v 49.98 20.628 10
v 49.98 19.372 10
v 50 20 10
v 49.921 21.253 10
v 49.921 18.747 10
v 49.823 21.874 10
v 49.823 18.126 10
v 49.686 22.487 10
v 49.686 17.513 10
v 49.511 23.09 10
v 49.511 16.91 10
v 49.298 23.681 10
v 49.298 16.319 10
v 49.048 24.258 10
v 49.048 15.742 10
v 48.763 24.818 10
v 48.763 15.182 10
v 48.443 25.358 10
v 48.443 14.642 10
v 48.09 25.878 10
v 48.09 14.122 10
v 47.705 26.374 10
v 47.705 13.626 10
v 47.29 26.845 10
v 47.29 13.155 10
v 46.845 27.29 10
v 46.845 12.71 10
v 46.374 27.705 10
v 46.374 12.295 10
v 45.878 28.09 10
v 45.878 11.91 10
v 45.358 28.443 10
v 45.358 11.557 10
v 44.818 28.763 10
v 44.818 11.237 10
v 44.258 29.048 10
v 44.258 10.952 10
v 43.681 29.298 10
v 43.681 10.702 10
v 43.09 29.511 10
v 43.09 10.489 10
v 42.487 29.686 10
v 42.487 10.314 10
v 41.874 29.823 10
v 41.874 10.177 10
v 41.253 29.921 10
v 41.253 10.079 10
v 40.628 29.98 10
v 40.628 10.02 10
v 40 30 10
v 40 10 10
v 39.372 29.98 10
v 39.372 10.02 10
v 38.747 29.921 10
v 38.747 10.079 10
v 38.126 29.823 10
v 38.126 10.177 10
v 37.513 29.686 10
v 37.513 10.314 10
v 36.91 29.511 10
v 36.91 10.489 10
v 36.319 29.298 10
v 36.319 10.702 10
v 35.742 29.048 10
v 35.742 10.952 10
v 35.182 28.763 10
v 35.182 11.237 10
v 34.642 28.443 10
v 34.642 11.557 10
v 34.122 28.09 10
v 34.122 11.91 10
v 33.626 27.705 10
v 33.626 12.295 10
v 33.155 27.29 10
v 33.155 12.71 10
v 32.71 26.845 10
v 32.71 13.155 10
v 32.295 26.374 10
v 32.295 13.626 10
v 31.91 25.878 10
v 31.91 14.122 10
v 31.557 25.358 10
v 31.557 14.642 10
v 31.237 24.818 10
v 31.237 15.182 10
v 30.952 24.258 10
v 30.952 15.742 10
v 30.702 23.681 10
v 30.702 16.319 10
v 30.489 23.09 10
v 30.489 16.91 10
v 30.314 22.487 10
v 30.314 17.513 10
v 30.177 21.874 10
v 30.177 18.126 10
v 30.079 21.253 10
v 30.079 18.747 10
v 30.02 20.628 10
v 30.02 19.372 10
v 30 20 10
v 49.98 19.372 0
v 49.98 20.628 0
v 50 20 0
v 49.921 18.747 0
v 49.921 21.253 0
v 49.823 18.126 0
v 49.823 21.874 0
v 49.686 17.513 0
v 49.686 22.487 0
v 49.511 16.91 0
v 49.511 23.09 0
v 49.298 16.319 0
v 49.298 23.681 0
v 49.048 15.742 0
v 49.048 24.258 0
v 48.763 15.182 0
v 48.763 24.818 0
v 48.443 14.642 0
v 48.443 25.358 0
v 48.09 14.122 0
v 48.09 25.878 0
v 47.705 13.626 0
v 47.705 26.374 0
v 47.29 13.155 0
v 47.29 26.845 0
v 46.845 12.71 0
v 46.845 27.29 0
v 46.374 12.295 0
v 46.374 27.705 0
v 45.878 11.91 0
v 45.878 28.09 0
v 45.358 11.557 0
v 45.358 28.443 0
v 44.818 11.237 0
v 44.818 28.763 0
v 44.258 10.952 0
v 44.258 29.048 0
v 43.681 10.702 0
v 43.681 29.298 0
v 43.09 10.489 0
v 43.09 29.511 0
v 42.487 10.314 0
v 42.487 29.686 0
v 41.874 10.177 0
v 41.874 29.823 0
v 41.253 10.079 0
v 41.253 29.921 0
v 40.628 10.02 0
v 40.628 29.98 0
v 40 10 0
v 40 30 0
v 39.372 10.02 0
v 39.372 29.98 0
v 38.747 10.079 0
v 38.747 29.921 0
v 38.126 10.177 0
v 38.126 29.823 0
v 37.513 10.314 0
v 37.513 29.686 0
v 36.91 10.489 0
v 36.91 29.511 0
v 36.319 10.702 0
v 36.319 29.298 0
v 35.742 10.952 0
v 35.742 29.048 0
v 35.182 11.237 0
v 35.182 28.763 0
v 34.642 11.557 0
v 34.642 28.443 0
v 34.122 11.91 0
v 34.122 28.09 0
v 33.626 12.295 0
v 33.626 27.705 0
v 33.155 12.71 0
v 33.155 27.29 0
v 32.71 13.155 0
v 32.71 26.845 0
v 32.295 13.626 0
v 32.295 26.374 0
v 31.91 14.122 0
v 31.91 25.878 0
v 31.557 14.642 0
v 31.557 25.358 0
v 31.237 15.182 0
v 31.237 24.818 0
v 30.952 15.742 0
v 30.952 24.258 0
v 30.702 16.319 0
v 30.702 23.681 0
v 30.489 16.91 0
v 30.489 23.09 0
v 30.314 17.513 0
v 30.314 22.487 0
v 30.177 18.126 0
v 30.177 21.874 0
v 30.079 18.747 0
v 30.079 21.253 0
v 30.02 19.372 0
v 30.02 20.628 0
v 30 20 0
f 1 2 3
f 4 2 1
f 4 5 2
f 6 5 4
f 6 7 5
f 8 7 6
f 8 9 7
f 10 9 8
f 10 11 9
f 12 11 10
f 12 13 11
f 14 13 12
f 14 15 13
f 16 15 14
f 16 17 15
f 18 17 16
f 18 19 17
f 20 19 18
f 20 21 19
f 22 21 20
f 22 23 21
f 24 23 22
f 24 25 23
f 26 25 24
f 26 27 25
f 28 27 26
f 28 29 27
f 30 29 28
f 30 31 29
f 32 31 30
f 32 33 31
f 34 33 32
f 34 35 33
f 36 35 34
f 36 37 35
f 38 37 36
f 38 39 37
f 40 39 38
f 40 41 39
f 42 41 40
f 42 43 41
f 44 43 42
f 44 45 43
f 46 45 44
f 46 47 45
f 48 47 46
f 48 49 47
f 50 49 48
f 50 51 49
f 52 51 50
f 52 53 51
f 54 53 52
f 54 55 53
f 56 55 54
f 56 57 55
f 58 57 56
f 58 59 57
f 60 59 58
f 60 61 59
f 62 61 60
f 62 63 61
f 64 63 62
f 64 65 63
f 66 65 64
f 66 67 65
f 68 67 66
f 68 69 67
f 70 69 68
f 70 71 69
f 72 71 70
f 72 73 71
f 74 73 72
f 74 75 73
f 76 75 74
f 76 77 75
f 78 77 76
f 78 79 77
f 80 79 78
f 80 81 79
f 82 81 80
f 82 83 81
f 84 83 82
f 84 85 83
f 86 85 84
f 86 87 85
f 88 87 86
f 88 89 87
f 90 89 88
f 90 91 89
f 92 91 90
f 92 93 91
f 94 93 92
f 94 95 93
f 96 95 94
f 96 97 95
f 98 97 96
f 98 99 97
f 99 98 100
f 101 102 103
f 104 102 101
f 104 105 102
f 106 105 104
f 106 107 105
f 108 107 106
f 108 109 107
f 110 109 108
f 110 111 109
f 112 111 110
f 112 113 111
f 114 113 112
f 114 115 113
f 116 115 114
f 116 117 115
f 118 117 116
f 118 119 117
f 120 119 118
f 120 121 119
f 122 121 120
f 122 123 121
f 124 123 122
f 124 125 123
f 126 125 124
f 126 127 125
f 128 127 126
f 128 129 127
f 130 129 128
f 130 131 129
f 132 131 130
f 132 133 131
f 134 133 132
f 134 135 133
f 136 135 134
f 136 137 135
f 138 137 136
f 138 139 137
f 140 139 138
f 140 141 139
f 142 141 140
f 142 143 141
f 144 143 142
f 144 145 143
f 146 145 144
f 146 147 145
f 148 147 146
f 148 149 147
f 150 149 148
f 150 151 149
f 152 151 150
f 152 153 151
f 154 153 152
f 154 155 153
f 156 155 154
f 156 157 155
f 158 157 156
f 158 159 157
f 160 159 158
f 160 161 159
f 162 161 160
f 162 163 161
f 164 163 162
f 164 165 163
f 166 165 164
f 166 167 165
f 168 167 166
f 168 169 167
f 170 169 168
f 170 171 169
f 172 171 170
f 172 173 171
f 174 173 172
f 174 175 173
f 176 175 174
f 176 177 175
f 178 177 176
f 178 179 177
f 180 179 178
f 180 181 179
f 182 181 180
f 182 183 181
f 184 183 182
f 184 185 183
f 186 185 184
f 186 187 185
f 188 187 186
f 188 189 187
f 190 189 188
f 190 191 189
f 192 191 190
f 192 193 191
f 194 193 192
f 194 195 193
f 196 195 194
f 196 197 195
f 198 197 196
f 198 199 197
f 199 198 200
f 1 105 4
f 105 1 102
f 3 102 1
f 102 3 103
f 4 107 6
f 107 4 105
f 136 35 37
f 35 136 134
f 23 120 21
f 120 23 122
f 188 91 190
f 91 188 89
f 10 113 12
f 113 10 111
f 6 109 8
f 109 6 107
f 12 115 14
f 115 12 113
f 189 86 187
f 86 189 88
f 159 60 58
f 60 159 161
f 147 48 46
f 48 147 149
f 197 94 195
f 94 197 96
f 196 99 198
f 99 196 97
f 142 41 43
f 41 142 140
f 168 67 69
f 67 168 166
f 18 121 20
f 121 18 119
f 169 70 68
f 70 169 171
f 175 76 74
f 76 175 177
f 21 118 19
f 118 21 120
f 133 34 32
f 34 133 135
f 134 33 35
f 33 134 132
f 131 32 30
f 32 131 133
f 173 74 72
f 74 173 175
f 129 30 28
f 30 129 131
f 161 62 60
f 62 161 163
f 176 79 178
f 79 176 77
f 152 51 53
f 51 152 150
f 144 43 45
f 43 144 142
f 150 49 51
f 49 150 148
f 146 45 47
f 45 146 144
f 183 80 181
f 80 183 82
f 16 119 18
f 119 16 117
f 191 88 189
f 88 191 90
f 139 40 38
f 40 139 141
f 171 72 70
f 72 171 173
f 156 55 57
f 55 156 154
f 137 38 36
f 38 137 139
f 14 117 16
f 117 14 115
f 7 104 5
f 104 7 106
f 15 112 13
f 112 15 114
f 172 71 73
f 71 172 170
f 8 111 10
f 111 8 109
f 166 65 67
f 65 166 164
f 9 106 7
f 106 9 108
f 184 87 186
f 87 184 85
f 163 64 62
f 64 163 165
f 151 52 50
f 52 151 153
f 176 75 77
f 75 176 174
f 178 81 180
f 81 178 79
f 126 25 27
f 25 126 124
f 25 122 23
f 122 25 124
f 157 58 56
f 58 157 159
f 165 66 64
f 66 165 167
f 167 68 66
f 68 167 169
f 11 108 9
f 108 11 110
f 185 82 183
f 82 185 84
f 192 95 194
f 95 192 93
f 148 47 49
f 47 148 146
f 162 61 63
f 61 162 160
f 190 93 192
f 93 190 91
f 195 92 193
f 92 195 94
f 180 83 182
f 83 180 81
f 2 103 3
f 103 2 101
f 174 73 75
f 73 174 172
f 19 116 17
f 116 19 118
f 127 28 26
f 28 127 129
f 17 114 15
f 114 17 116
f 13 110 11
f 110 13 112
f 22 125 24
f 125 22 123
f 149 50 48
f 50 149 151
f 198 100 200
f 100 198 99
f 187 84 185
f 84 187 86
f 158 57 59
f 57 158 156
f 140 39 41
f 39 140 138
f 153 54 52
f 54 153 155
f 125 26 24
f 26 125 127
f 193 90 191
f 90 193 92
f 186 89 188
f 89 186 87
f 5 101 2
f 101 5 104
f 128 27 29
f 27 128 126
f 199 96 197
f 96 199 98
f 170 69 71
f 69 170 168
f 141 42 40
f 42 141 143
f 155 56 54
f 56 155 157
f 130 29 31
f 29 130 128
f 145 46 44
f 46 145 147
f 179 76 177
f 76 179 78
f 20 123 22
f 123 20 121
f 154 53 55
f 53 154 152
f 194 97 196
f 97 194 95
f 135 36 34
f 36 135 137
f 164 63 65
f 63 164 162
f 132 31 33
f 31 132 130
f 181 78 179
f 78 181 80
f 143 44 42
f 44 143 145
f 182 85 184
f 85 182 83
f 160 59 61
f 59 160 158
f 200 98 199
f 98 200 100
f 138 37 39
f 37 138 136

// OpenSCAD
$fn = 100;

intersection() {
    cube ([80, 40, 10]);
    translate([40, 20, -20])
    cylinder(r=10, h=50);    
}
